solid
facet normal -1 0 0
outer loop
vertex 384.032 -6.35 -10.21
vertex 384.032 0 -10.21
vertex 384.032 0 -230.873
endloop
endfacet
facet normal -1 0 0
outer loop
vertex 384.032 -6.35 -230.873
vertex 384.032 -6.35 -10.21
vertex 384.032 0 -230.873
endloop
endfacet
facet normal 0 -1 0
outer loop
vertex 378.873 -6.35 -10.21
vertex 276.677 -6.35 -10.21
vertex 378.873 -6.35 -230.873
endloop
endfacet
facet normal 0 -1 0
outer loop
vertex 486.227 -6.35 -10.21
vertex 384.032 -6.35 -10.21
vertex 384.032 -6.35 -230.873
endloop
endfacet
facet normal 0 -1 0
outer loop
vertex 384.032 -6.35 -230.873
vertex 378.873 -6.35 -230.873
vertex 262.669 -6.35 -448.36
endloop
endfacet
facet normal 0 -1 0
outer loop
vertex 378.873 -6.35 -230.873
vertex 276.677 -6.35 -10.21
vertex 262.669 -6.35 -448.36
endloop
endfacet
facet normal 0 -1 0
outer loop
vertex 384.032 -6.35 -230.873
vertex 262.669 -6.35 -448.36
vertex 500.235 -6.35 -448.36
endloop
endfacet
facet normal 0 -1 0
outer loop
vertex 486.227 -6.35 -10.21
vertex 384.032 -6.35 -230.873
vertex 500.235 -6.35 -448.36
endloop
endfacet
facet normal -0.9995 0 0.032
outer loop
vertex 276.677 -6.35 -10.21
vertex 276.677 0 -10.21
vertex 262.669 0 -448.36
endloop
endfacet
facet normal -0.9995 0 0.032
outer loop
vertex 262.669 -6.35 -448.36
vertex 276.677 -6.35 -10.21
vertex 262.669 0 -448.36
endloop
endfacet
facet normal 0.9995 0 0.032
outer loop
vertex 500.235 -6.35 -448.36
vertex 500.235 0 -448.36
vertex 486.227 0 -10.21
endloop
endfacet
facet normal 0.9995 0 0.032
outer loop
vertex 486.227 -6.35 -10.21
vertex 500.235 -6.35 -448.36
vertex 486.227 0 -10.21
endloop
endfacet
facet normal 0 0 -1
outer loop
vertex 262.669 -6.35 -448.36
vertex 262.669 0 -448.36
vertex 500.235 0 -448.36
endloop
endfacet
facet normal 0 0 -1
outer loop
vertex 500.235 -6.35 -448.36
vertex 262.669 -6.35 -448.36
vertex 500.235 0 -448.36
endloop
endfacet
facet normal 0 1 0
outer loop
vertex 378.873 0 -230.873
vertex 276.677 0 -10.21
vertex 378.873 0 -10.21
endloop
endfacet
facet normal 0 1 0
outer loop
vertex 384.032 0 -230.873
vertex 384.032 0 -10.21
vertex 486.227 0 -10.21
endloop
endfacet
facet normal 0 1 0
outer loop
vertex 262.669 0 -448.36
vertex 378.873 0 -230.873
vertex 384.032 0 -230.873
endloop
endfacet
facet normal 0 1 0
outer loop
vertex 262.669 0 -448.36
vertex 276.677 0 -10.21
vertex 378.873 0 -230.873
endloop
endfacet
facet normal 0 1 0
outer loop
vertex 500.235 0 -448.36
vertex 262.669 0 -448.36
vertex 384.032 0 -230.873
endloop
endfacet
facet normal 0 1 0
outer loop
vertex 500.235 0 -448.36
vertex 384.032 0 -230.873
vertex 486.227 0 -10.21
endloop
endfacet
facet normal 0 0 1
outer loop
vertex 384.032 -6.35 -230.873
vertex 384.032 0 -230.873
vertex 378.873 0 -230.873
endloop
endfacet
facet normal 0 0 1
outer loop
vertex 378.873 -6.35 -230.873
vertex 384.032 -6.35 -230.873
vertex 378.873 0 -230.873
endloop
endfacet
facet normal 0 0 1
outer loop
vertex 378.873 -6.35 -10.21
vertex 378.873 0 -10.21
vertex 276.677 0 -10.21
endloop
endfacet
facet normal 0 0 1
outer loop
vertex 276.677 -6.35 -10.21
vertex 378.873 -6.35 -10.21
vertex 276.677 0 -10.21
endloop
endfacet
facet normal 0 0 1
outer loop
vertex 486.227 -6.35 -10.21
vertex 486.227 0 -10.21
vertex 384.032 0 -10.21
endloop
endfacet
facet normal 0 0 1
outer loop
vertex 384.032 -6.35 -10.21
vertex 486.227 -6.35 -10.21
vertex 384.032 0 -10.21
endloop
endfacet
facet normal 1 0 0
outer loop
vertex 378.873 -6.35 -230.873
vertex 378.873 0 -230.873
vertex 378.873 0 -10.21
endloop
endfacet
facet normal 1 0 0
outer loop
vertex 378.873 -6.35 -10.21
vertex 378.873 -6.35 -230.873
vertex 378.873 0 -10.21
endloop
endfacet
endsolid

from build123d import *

# Parameters (mm, degrees)
BOSS_EXTRUDE1_DEPTH = 6.35
SKETCH2_W           = 27.9781
SKETCH2_H           = 17.4625
BOSS_EXTRUDE2_DEPTH = 6.35


with BuildPart() as part:
    # Sketch1 → Boss-Extrude1 (new body)
    with BuildSketch(Plane(origin=(0, 0, 0), x_dir=(1, 0, 0), z_dir=(0, 1, 0))):
        Polygon((262.669201475, 448.360447089), (367.463251475, 448.360447089), (367.463251475, 430.897947089), (395.441351475, 430.897947089), (395.441351475, 448.360447089), (500.235401475, 448.360447089), (486.227301475, 10.210447089), (384.031988975, 10.210447089), (384.031988975, 230.872947089), (378.872613975, 230.872947089), (378.872613975, 10.210447089), (276.677301475, 10.210447089), align=None)
    extrude(amount=-BOSS_EXTRUDE1_DEPTH)

    # Sketch2 → Boss-Extrude2 (add)
    with BuildSketch(Plane(origin=(0, 0, 0), x_dir=(1, 0, 0), z_dir=(0, 1, 0))):
        with Locations((381.452301475, 439.629197089)):
            Rectangle(SKETCH2_W, SKETCH2_H)
    extrude(amount=-BOSS_EXTRUDE2_DEPTH)


solid = part.part
